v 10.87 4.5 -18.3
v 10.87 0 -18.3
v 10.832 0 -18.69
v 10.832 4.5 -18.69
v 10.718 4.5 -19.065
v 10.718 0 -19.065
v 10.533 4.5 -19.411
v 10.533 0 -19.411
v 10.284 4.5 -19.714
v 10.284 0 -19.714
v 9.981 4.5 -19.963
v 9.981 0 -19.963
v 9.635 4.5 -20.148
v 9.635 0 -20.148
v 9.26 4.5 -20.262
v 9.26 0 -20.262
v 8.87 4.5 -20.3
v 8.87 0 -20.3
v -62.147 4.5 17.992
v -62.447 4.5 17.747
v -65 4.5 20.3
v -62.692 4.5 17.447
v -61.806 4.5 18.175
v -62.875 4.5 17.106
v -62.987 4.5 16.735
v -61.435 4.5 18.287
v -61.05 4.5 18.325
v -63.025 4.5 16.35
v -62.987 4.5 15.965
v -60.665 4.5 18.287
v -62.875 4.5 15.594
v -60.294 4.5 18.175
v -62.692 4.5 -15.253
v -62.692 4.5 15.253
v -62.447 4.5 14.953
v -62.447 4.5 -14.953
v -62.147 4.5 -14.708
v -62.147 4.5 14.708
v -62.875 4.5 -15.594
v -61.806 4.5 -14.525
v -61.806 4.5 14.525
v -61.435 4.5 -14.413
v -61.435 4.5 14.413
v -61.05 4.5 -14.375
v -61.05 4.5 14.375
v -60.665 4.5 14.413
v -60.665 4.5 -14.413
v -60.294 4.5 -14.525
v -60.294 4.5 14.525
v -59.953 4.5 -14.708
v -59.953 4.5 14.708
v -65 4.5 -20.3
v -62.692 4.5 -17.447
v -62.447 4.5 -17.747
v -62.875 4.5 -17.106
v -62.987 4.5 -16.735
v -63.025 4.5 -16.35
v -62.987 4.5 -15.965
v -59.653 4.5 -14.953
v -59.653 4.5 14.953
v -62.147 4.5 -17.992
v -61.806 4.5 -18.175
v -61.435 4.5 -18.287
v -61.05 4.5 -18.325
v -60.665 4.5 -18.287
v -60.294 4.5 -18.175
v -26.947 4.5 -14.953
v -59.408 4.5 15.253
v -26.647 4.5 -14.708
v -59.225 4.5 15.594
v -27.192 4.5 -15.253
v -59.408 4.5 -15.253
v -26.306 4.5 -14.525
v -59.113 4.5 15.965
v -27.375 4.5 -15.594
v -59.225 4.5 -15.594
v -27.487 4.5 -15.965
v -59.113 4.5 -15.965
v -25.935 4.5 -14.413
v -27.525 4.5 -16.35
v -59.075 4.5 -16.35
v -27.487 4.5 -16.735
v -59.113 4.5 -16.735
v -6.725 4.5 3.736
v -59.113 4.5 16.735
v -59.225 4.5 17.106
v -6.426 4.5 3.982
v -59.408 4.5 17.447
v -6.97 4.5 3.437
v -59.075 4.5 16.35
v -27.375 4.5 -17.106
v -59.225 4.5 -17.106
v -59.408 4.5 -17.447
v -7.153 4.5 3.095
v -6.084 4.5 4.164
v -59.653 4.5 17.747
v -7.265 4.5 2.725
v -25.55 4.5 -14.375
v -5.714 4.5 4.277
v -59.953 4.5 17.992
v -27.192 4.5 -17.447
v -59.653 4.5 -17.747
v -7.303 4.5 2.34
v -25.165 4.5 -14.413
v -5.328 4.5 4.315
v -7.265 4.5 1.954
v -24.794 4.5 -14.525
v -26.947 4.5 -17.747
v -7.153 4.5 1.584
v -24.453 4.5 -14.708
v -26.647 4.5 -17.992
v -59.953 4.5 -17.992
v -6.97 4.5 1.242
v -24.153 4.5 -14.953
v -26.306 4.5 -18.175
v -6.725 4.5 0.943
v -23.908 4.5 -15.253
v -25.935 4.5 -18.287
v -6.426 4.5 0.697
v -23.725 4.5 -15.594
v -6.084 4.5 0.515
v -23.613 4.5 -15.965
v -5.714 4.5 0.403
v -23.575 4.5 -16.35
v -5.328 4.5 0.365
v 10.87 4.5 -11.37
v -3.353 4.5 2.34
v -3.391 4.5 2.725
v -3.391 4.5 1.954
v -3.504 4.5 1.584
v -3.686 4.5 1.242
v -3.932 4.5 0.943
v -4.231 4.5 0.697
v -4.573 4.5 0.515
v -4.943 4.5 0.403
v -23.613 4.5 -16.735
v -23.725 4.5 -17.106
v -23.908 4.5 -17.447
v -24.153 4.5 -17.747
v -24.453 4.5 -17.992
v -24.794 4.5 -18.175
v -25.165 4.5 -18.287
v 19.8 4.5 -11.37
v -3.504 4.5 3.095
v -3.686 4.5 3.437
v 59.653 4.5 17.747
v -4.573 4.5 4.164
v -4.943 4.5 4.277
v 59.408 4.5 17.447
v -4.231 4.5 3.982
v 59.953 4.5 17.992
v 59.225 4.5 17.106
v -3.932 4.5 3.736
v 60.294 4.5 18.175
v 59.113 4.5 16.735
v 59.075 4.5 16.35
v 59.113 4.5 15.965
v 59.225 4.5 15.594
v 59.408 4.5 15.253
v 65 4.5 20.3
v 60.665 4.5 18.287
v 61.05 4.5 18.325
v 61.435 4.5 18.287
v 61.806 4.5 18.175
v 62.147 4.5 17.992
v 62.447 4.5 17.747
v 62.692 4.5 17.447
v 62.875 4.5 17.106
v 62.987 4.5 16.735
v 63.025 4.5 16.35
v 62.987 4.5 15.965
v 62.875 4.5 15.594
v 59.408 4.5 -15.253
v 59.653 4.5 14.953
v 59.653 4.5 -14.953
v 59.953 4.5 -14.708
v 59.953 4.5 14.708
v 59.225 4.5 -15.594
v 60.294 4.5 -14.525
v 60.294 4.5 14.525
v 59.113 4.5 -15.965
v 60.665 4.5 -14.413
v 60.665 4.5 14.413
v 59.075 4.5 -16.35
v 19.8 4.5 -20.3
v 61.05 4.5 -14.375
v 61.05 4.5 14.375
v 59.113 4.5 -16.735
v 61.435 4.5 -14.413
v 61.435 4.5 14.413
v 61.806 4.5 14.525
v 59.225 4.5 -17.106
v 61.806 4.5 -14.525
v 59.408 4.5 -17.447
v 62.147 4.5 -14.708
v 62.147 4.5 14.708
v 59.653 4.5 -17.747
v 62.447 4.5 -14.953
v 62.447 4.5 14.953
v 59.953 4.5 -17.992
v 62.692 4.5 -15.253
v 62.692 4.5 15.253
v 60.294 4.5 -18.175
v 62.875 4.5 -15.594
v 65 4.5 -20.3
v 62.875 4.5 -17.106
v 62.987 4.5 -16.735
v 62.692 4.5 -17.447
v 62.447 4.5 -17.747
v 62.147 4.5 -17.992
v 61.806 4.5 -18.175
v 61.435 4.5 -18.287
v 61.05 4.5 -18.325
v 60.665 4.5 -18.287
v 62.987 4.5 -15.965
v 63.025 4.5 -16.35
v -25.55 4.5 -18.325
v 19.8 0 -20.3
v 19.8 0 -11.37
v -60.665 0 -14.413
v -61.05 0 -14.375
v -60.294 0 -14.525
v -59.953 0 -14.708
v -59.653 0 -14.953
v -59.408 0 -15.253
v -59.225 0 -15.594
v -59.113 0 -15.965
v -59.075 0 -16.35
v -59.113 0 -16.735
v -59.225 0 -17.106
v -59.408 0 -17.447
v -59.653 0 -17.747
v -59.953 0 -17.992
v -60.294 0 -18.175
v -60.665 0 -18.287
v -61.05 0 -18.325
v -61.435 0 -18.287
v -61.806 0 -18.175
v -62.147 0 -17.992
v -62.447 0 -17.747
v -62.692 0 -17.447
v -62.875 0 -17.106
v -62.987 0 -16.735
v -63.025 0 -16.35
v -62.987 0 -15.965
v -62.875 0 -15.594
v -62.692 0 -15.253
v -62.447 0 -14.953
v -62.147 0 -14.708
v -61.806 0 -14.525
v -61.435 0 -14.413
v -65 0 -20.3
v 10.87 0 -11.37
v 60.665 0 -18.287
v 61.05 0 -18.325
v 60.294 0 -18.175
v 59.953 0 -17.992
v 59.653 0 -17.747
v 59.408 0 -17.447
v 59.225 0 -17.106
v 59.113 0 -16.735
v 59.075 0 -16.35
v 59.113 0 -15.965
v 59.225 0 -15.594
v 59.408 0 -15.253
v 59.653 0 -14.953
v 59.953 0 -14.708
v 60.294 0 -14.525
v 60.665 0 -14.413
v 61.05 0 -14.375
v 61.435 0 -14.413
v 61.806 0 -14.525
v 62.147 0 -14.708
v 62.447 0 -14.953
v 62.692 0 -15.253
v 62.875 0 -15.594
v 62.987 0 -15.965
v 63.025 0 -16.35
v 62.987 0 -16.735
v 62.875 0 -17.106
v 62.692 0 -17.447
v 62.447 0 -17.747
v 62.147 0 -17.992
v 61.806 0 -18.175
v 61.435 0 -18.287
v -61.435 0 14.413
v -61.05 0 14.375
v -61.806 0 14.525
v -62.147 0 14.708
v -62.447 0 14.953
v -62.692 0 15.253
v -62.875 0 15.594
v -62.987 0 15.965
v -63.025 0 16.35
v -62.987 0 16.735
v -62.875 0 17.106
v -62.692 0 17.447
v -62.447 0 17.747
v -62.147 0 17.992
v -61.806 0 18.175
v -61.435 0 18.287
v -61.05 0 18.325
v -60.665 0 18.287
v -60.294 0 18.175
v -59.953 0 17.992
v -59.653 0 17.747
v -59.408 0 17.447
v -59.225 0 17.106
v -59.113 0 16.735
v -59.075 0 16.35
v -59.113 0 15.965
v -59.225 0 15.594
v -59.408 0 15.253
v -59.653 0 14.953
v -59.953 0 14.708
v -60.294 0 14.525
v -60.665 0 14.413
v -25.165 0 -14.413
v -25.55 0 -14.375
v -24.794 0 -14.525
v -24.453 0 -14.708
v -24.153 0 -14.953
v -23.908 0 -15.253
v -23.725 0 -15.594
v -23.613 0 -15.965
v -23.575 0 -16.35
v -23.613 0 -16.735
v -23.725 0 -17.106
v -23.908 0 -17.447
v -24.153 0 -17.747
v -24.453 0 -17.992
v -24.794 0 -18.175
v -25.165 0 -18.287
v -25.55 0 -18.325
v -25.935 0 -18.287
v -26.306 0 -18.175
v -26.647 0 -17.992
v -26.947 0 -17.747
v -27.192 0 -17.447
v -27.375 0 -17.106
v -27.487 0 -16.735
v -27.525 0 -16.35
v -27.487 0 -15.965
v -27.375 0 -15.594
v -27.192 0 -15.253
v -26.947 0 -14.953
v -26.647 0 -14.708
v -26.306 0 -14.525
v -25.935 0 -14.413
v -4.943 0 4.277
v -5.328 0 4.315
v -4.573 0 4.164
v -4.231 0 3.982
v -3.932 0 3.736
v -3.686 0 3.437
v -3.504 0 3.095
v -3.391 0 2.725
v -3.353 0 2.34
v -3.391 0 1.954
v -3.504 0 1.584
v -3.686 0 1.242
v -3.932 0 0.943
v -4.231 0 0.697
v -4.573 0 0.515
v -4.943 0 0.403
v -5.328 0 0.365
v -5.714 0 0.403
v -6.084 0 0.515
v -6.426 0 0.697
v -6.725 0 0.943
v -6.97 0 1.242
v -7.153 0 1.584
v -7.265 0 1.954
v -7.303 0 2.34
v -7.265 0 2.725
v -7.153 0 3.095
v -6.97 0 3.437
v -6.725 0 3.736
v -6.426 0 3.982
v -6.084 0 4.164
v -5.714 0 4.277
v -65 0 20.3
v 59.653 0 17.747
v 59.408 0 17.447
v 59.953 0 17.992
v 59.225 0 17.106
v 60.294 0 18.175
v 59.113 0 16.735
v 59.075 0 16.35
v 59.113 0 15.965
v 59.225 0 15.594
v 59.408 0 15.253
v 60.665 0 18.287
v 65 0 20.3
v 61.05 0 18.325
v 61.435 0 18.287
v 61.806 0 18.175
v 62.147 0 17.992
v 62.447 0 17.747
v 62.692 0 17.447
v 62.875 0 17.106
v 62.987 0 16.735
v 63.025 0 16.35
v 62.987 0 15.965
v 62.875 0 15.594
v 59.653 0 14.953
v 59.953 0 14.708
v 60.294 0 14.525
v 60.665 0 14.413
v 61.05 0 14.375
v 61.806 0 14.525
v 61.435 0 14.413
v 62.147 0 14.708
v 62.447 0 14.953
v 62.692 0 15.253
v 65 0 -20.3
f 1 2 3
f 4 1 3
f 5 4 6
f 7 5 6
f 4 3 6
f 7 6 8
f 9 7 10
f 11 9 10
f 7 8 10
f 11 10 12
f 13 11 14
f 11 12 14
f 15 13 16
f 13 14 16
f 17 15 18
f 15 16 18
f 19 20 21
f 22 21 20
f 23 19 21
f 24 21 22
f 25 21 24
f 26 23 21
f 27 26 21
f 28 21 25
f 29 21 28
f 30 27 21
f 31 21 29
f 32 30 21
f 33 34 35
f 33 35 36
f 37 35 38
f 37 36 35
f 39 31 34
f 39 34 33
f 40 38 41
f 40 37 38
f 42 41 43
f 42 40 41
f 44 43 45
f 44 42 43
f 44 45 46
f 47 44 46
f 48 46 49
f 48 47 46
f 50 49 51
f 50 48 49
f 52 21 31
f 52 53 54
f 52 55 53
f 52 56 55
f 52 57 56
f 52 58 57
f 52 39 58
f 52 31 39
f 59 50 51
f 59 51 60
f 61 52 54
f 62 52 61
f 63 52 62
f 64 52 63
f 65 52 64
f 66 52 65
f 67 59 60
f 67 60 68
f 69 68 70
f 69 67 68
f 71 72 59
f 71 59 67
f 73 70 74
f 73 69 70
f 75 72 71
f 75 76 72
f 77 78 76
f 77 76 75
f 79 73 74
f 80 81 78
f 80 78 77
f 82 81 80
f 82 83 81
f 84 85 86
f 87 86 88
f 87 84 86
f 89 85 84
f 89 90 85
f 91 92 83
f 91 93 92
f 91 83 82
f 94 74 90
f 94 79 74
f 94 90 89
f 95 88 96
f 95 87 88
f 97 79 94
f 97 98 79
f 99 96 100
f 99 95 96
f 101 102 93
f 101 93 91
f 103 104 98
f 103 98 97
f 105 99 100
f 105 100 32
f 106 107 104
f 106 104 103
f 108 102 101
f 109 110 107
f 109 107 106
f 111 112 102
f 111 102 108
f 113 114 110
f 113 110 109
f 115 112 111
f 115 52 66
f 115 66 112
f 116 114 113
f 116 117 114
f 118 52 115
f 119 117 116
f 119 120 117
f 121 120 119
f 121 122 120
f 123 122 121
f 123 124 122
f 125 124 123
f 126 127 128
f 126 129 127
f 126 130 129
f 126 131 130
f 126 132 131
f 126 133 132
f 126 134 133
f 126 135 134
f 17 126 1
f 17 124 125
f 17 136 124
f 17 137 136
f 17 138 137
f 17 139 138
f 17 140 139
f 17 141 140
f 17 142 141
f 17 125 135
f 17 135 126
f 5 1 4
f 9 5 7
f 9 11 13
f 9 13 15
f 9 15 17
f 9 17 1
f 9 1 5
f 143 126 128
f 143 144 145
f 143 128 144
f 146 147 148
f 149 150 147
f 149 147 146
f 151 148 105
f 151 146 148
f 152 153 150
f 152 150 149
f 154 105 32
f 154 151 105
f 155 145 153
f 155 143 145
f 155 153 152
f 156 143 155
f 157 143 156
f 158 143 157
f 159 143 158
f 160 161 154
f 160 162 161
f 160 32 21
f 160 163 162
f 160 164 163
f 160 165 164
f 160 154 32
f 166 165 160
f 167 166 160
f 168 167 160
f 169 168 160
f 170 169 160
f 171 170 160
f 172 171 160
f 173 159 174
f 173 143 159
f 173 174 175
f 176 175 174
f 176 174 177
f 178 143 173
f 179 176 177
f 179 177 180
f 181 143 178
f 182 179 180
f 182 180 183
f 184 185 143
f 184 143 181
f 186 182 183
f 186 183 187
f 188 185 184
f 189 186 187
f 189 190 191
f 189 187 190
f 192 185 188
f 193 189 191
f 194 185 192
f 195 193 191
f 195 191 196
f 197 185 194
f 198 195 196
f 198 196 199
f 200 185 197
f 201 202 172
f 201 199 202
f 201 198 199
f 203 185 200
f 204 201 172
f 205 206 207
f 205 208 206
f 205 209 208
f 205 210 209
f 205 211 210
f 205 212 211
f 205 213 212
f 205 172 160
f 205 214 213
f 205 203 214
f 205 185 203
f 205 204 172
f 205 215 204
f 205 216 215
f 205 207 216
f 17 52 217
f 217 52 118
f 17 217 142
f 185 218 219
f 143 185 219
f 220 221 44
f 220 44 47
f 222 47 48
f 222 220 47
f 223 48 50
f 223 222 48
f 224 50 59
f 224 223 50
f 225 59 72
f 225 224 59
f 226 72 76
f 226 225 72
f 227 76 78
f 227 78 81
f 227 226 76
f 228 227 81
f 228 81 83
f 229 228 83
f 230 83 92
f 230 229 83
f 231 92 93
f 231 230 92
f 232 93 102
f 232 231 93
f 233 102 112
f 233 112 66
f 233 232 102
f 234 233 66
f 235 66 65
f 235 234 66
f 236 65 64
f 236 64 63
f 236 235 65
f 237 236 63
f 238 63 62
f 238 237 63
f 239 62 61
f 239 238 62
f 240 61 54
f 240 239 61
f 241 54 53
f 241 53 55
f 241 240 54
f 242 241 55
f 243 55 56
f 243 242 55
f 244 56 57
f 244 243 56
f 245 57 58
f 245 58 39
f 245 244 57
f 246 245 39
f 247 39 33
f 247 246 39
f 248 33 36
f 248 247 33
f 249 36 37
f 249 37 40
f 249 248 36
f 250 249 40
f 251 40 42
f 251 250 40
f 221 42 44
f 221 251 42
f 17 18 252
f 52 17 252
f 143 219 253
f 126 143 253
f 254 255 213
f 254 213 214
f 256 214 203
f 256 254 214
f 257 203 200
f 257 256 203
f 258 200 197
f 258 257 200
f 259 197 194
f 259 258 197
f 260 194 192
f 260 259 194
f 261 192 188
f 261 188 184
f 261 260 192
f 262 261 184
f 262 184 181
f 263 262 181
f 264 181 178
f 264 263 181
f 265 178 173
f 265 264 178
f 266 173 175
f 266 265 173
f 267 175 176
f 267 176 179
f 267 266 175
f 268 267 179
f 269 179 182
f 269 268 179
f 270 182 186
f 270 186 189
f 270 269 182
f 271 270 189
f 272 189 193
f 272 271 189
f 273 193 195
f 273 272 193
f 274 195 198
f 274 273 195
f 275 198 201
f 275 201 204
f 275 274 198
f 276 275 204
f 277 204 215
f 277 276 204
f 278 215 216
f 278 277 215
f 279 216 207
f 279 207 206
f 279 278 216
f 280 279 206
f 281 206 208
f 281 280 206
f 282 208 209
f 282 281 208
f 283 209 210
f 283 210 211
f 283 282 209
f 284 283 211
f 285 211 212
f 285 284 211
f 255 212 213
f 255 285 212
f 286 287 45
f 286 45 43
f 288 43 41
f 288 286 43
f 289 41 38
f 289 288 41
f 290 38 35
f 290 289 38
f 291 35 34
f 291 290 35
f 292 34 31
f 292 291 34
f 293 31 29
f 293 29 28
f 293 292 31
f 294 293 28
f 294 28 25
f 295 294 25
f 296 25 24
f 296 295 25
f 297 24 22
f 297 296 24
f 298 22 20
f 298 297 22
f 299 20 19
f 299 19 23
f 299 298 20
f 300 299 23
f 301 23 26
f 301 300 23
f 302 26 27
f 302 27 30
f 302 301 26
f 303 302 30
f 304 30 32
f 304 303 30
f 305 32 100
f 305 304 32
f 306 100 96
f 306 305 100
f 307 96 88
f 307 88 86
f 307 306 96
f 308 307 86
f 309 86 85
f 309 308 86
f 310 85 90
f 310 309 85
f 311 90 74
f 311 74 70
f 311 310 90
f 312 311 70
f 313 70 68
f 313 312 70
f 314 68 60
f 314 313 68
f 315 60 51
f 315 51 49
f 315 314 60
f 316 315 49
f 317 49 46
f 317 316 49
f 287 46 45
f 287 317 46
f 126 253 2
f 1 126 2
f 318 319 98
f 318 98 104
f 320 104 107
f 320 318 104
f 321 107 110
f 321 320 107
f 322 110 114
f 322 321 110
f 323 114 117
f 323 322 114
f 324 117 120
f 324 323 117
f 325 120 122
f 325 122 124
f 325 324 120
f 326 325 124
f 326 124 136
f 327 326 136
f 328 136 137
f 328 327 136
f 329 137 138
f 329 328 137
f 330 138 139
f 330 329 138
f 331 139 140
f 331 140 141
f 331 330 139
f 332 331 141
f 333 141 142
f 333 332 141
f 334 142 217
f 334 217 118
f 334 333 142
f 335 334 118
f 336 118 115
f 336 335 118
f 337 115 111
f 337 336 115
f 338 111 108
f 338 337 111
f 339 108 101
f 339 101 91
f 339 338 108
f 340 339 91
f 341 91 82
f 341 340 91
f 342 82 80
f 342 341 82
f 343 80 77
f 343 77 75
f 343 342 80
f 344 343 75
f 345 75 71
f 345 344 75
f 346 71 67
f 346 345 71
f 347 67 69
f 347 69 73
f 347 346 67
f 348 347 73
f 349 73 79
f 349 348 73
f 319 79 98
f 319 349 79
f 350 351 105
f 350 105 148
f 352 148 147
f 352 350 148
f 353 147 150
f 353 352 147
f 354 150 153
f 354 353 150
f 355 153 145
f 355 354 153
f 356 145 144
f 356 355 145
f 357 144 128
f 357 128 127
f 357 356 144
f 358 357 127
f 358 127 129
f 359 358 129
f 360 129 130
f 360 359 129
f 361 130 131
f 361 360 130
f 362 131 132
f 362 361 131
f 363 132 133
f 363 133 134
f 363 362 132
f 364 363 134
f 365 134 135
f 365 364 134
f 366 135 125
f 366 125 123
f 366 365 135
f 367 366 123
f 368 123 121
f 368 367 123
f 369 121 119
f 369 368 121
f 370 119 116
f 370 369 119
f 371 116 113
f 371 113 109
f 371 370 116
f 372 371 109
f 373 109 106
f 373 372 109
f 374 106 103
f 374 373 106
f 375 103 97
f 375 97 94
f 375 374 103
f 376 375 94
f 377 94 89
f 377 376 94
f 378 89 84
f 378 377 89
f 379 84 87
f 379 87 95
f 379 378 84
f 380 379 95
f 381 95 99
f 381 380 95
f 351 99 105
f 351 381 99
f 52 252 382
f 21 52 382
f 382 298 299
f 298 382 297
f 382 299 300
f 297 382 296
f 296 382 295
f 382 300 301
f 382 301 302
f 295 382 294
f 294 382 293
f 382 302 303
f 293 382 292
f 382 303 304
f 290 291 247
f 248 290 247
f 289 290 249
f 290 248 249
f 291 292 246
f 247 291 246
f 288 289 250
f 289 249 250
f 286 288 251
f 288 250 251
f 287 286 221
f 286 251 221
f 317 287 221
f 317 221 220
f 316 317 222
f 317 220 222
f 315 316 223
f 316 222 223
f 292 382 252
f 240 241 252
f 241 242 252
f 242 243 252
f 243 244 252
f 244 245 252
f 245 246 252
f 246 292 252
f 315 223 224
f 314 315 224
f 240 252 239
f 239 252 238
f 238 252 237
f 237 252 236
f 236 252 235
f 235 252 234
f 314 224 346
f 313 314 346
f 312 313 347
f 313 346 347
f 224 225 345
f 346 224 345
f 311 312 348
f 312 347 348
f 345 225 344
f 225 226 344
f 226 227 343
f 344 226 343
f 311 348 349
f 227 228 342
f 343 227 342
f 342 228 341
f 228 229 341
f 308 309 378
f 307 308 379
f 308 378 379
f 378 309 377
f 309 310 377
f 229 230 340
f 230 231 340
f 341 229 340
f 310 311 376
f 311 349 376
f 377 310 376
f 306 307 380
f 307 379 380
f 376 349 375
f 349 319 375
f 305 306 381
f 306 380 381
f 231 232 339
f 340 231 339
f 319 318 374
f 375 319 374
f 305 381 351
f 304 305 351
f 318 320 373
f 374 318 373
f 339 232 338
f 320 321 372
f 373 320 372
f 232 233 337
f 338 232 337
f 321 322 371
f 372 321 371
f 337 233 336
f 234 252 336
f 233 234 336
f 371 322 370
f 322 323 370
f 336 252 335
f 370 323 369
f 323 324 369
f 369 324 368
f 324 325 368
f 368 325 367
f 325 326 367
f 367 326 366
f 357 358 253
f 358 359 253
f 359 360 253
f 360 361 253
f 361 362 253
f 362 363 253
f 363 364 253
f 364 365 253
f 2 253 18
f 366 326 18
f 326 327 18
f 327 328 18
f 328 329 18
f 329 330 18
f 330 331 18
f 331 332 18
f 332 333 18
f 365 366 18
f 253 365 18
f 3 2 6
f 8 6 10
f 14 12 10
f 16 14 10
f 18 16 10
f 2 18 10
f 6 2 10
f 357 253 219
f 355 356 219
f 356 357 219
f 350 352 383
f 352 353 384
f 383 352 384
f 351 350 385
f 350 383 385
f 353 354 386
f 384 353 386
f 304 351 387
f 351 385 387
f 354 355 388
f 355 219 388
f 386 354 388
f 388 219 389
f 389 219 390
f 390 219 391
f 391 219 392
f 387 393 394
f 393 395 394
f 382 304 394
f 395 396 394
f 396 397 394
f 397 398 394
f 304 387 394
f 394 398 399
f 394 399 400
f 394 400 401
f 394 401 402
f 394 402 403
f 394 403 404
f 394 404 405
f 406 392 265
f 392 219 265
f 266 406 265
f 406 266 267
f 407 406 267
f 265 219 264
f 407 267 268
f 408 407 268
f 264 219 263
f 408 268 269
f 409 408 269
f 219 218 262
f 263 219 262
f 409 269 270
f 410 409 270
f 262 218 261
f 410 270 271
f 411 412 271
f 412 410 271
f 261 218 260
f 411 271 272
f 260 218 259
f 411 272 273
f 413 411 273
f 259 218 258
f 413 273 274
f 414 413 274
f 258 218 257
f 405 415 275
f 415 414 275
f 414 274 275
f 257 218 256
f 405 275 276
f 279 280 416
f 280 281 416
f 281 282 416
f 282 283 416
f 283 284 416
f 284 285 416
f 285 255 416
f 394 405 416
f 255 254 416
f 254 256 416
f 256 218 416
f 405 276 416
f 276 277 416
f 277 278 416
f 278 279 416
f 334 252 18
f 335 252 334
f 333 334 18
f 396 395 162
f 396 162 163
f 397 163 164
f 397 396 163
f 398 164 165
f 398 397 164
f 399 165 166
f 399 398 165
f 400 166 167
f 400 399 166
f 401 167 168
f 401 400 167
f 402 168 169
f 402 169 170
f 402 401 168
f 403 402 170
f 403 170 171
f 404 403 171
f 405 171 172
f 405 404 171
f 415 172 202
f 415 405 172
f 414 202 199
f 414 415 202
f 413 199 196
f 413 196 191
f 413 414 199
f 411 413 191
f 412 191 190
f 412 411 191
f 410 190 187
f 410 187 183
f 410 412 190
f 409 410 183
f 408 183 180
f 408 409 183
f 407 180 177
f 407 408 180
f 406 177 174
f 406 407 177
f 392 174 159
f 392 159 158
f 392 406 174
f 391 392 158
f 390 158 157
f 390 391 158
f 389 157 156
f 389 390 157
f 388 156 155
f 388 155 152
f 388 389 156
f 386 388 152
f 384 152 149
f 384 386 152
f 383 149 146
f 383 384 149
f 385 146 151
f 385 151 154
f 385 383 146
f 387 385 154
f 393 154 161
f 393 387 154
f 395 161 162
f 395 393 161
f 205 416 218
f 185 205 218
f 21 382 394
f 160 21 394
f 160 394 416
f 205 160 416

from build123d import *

# Parameters (mm, degrees)
SKETCH1_R           = 1.975
BOSS_EXTRUDE1_DEPTH = 4.5


with BuildPart() as part:
    # Sketch1 → Boss-Extrude1 (new body)
    with BuildSketch(Plane(origin=(0, 0, 0), x_dir=(1, 0, 0), z_dir=(0, 1, 0))):
        with BuildLine():
            Line((65, 20.3), (19.8, 20.3))
            Line((19.8, 20.3), (19.8, 11.37))
            Line((19.8, 11.37), (10.87, 11.37))
            Line((10.87, 11.37), (10.87, 18.3))
            ThreePointArc((10.87, 18.3), (10.284213562, 19.714213562), (8.87, 20.3))
            Line((8.87, 20.3), (-65, 20.3))
            Line((-65, 20.3), (-65, -20.3))
            Line((-65, -20.3), (65, -20.3))
            Line((65, -20.3), (65, 20.3))
        make_face()
        with Locations(Location((-61.05, 16.35, 0), (0, 0, 270))):
            Circle(SKETCH1_R, mode=Mode.SUBTRACT)
        with Locations(Location((61.05, 16.35, 0), (0, 0, 90))):
            Circle(SKETCH1_R, mode=Mode.SUBTRACT)
        with Locations(Location((61.05, -16.35, 0), (0, 0, 270))):
            Circle(SKETCH1_R, mode=Mode.SUBTRACT)
        with Locations(Location((-61.05, -16.35, 0), (0, 0, 90))):
            Circle(SKETCH1_R, mode=Mode.SUBTRACT)
        with Locations(Location((-25.55, 16.35, 0), (0, 0, 270))):
            Circle(SKETCH1_R, mode=Mode.SUBTRACT)
        with Locations(Location((-5.328324842, -2.339651524, 0), (0, 0, 270))):
            Circle(SKETCH1_R, mode=Mode.SUBTRACT)
    extrude(amount=BOSS_EXTRUDE1_DEPTH)


solid = part.part
